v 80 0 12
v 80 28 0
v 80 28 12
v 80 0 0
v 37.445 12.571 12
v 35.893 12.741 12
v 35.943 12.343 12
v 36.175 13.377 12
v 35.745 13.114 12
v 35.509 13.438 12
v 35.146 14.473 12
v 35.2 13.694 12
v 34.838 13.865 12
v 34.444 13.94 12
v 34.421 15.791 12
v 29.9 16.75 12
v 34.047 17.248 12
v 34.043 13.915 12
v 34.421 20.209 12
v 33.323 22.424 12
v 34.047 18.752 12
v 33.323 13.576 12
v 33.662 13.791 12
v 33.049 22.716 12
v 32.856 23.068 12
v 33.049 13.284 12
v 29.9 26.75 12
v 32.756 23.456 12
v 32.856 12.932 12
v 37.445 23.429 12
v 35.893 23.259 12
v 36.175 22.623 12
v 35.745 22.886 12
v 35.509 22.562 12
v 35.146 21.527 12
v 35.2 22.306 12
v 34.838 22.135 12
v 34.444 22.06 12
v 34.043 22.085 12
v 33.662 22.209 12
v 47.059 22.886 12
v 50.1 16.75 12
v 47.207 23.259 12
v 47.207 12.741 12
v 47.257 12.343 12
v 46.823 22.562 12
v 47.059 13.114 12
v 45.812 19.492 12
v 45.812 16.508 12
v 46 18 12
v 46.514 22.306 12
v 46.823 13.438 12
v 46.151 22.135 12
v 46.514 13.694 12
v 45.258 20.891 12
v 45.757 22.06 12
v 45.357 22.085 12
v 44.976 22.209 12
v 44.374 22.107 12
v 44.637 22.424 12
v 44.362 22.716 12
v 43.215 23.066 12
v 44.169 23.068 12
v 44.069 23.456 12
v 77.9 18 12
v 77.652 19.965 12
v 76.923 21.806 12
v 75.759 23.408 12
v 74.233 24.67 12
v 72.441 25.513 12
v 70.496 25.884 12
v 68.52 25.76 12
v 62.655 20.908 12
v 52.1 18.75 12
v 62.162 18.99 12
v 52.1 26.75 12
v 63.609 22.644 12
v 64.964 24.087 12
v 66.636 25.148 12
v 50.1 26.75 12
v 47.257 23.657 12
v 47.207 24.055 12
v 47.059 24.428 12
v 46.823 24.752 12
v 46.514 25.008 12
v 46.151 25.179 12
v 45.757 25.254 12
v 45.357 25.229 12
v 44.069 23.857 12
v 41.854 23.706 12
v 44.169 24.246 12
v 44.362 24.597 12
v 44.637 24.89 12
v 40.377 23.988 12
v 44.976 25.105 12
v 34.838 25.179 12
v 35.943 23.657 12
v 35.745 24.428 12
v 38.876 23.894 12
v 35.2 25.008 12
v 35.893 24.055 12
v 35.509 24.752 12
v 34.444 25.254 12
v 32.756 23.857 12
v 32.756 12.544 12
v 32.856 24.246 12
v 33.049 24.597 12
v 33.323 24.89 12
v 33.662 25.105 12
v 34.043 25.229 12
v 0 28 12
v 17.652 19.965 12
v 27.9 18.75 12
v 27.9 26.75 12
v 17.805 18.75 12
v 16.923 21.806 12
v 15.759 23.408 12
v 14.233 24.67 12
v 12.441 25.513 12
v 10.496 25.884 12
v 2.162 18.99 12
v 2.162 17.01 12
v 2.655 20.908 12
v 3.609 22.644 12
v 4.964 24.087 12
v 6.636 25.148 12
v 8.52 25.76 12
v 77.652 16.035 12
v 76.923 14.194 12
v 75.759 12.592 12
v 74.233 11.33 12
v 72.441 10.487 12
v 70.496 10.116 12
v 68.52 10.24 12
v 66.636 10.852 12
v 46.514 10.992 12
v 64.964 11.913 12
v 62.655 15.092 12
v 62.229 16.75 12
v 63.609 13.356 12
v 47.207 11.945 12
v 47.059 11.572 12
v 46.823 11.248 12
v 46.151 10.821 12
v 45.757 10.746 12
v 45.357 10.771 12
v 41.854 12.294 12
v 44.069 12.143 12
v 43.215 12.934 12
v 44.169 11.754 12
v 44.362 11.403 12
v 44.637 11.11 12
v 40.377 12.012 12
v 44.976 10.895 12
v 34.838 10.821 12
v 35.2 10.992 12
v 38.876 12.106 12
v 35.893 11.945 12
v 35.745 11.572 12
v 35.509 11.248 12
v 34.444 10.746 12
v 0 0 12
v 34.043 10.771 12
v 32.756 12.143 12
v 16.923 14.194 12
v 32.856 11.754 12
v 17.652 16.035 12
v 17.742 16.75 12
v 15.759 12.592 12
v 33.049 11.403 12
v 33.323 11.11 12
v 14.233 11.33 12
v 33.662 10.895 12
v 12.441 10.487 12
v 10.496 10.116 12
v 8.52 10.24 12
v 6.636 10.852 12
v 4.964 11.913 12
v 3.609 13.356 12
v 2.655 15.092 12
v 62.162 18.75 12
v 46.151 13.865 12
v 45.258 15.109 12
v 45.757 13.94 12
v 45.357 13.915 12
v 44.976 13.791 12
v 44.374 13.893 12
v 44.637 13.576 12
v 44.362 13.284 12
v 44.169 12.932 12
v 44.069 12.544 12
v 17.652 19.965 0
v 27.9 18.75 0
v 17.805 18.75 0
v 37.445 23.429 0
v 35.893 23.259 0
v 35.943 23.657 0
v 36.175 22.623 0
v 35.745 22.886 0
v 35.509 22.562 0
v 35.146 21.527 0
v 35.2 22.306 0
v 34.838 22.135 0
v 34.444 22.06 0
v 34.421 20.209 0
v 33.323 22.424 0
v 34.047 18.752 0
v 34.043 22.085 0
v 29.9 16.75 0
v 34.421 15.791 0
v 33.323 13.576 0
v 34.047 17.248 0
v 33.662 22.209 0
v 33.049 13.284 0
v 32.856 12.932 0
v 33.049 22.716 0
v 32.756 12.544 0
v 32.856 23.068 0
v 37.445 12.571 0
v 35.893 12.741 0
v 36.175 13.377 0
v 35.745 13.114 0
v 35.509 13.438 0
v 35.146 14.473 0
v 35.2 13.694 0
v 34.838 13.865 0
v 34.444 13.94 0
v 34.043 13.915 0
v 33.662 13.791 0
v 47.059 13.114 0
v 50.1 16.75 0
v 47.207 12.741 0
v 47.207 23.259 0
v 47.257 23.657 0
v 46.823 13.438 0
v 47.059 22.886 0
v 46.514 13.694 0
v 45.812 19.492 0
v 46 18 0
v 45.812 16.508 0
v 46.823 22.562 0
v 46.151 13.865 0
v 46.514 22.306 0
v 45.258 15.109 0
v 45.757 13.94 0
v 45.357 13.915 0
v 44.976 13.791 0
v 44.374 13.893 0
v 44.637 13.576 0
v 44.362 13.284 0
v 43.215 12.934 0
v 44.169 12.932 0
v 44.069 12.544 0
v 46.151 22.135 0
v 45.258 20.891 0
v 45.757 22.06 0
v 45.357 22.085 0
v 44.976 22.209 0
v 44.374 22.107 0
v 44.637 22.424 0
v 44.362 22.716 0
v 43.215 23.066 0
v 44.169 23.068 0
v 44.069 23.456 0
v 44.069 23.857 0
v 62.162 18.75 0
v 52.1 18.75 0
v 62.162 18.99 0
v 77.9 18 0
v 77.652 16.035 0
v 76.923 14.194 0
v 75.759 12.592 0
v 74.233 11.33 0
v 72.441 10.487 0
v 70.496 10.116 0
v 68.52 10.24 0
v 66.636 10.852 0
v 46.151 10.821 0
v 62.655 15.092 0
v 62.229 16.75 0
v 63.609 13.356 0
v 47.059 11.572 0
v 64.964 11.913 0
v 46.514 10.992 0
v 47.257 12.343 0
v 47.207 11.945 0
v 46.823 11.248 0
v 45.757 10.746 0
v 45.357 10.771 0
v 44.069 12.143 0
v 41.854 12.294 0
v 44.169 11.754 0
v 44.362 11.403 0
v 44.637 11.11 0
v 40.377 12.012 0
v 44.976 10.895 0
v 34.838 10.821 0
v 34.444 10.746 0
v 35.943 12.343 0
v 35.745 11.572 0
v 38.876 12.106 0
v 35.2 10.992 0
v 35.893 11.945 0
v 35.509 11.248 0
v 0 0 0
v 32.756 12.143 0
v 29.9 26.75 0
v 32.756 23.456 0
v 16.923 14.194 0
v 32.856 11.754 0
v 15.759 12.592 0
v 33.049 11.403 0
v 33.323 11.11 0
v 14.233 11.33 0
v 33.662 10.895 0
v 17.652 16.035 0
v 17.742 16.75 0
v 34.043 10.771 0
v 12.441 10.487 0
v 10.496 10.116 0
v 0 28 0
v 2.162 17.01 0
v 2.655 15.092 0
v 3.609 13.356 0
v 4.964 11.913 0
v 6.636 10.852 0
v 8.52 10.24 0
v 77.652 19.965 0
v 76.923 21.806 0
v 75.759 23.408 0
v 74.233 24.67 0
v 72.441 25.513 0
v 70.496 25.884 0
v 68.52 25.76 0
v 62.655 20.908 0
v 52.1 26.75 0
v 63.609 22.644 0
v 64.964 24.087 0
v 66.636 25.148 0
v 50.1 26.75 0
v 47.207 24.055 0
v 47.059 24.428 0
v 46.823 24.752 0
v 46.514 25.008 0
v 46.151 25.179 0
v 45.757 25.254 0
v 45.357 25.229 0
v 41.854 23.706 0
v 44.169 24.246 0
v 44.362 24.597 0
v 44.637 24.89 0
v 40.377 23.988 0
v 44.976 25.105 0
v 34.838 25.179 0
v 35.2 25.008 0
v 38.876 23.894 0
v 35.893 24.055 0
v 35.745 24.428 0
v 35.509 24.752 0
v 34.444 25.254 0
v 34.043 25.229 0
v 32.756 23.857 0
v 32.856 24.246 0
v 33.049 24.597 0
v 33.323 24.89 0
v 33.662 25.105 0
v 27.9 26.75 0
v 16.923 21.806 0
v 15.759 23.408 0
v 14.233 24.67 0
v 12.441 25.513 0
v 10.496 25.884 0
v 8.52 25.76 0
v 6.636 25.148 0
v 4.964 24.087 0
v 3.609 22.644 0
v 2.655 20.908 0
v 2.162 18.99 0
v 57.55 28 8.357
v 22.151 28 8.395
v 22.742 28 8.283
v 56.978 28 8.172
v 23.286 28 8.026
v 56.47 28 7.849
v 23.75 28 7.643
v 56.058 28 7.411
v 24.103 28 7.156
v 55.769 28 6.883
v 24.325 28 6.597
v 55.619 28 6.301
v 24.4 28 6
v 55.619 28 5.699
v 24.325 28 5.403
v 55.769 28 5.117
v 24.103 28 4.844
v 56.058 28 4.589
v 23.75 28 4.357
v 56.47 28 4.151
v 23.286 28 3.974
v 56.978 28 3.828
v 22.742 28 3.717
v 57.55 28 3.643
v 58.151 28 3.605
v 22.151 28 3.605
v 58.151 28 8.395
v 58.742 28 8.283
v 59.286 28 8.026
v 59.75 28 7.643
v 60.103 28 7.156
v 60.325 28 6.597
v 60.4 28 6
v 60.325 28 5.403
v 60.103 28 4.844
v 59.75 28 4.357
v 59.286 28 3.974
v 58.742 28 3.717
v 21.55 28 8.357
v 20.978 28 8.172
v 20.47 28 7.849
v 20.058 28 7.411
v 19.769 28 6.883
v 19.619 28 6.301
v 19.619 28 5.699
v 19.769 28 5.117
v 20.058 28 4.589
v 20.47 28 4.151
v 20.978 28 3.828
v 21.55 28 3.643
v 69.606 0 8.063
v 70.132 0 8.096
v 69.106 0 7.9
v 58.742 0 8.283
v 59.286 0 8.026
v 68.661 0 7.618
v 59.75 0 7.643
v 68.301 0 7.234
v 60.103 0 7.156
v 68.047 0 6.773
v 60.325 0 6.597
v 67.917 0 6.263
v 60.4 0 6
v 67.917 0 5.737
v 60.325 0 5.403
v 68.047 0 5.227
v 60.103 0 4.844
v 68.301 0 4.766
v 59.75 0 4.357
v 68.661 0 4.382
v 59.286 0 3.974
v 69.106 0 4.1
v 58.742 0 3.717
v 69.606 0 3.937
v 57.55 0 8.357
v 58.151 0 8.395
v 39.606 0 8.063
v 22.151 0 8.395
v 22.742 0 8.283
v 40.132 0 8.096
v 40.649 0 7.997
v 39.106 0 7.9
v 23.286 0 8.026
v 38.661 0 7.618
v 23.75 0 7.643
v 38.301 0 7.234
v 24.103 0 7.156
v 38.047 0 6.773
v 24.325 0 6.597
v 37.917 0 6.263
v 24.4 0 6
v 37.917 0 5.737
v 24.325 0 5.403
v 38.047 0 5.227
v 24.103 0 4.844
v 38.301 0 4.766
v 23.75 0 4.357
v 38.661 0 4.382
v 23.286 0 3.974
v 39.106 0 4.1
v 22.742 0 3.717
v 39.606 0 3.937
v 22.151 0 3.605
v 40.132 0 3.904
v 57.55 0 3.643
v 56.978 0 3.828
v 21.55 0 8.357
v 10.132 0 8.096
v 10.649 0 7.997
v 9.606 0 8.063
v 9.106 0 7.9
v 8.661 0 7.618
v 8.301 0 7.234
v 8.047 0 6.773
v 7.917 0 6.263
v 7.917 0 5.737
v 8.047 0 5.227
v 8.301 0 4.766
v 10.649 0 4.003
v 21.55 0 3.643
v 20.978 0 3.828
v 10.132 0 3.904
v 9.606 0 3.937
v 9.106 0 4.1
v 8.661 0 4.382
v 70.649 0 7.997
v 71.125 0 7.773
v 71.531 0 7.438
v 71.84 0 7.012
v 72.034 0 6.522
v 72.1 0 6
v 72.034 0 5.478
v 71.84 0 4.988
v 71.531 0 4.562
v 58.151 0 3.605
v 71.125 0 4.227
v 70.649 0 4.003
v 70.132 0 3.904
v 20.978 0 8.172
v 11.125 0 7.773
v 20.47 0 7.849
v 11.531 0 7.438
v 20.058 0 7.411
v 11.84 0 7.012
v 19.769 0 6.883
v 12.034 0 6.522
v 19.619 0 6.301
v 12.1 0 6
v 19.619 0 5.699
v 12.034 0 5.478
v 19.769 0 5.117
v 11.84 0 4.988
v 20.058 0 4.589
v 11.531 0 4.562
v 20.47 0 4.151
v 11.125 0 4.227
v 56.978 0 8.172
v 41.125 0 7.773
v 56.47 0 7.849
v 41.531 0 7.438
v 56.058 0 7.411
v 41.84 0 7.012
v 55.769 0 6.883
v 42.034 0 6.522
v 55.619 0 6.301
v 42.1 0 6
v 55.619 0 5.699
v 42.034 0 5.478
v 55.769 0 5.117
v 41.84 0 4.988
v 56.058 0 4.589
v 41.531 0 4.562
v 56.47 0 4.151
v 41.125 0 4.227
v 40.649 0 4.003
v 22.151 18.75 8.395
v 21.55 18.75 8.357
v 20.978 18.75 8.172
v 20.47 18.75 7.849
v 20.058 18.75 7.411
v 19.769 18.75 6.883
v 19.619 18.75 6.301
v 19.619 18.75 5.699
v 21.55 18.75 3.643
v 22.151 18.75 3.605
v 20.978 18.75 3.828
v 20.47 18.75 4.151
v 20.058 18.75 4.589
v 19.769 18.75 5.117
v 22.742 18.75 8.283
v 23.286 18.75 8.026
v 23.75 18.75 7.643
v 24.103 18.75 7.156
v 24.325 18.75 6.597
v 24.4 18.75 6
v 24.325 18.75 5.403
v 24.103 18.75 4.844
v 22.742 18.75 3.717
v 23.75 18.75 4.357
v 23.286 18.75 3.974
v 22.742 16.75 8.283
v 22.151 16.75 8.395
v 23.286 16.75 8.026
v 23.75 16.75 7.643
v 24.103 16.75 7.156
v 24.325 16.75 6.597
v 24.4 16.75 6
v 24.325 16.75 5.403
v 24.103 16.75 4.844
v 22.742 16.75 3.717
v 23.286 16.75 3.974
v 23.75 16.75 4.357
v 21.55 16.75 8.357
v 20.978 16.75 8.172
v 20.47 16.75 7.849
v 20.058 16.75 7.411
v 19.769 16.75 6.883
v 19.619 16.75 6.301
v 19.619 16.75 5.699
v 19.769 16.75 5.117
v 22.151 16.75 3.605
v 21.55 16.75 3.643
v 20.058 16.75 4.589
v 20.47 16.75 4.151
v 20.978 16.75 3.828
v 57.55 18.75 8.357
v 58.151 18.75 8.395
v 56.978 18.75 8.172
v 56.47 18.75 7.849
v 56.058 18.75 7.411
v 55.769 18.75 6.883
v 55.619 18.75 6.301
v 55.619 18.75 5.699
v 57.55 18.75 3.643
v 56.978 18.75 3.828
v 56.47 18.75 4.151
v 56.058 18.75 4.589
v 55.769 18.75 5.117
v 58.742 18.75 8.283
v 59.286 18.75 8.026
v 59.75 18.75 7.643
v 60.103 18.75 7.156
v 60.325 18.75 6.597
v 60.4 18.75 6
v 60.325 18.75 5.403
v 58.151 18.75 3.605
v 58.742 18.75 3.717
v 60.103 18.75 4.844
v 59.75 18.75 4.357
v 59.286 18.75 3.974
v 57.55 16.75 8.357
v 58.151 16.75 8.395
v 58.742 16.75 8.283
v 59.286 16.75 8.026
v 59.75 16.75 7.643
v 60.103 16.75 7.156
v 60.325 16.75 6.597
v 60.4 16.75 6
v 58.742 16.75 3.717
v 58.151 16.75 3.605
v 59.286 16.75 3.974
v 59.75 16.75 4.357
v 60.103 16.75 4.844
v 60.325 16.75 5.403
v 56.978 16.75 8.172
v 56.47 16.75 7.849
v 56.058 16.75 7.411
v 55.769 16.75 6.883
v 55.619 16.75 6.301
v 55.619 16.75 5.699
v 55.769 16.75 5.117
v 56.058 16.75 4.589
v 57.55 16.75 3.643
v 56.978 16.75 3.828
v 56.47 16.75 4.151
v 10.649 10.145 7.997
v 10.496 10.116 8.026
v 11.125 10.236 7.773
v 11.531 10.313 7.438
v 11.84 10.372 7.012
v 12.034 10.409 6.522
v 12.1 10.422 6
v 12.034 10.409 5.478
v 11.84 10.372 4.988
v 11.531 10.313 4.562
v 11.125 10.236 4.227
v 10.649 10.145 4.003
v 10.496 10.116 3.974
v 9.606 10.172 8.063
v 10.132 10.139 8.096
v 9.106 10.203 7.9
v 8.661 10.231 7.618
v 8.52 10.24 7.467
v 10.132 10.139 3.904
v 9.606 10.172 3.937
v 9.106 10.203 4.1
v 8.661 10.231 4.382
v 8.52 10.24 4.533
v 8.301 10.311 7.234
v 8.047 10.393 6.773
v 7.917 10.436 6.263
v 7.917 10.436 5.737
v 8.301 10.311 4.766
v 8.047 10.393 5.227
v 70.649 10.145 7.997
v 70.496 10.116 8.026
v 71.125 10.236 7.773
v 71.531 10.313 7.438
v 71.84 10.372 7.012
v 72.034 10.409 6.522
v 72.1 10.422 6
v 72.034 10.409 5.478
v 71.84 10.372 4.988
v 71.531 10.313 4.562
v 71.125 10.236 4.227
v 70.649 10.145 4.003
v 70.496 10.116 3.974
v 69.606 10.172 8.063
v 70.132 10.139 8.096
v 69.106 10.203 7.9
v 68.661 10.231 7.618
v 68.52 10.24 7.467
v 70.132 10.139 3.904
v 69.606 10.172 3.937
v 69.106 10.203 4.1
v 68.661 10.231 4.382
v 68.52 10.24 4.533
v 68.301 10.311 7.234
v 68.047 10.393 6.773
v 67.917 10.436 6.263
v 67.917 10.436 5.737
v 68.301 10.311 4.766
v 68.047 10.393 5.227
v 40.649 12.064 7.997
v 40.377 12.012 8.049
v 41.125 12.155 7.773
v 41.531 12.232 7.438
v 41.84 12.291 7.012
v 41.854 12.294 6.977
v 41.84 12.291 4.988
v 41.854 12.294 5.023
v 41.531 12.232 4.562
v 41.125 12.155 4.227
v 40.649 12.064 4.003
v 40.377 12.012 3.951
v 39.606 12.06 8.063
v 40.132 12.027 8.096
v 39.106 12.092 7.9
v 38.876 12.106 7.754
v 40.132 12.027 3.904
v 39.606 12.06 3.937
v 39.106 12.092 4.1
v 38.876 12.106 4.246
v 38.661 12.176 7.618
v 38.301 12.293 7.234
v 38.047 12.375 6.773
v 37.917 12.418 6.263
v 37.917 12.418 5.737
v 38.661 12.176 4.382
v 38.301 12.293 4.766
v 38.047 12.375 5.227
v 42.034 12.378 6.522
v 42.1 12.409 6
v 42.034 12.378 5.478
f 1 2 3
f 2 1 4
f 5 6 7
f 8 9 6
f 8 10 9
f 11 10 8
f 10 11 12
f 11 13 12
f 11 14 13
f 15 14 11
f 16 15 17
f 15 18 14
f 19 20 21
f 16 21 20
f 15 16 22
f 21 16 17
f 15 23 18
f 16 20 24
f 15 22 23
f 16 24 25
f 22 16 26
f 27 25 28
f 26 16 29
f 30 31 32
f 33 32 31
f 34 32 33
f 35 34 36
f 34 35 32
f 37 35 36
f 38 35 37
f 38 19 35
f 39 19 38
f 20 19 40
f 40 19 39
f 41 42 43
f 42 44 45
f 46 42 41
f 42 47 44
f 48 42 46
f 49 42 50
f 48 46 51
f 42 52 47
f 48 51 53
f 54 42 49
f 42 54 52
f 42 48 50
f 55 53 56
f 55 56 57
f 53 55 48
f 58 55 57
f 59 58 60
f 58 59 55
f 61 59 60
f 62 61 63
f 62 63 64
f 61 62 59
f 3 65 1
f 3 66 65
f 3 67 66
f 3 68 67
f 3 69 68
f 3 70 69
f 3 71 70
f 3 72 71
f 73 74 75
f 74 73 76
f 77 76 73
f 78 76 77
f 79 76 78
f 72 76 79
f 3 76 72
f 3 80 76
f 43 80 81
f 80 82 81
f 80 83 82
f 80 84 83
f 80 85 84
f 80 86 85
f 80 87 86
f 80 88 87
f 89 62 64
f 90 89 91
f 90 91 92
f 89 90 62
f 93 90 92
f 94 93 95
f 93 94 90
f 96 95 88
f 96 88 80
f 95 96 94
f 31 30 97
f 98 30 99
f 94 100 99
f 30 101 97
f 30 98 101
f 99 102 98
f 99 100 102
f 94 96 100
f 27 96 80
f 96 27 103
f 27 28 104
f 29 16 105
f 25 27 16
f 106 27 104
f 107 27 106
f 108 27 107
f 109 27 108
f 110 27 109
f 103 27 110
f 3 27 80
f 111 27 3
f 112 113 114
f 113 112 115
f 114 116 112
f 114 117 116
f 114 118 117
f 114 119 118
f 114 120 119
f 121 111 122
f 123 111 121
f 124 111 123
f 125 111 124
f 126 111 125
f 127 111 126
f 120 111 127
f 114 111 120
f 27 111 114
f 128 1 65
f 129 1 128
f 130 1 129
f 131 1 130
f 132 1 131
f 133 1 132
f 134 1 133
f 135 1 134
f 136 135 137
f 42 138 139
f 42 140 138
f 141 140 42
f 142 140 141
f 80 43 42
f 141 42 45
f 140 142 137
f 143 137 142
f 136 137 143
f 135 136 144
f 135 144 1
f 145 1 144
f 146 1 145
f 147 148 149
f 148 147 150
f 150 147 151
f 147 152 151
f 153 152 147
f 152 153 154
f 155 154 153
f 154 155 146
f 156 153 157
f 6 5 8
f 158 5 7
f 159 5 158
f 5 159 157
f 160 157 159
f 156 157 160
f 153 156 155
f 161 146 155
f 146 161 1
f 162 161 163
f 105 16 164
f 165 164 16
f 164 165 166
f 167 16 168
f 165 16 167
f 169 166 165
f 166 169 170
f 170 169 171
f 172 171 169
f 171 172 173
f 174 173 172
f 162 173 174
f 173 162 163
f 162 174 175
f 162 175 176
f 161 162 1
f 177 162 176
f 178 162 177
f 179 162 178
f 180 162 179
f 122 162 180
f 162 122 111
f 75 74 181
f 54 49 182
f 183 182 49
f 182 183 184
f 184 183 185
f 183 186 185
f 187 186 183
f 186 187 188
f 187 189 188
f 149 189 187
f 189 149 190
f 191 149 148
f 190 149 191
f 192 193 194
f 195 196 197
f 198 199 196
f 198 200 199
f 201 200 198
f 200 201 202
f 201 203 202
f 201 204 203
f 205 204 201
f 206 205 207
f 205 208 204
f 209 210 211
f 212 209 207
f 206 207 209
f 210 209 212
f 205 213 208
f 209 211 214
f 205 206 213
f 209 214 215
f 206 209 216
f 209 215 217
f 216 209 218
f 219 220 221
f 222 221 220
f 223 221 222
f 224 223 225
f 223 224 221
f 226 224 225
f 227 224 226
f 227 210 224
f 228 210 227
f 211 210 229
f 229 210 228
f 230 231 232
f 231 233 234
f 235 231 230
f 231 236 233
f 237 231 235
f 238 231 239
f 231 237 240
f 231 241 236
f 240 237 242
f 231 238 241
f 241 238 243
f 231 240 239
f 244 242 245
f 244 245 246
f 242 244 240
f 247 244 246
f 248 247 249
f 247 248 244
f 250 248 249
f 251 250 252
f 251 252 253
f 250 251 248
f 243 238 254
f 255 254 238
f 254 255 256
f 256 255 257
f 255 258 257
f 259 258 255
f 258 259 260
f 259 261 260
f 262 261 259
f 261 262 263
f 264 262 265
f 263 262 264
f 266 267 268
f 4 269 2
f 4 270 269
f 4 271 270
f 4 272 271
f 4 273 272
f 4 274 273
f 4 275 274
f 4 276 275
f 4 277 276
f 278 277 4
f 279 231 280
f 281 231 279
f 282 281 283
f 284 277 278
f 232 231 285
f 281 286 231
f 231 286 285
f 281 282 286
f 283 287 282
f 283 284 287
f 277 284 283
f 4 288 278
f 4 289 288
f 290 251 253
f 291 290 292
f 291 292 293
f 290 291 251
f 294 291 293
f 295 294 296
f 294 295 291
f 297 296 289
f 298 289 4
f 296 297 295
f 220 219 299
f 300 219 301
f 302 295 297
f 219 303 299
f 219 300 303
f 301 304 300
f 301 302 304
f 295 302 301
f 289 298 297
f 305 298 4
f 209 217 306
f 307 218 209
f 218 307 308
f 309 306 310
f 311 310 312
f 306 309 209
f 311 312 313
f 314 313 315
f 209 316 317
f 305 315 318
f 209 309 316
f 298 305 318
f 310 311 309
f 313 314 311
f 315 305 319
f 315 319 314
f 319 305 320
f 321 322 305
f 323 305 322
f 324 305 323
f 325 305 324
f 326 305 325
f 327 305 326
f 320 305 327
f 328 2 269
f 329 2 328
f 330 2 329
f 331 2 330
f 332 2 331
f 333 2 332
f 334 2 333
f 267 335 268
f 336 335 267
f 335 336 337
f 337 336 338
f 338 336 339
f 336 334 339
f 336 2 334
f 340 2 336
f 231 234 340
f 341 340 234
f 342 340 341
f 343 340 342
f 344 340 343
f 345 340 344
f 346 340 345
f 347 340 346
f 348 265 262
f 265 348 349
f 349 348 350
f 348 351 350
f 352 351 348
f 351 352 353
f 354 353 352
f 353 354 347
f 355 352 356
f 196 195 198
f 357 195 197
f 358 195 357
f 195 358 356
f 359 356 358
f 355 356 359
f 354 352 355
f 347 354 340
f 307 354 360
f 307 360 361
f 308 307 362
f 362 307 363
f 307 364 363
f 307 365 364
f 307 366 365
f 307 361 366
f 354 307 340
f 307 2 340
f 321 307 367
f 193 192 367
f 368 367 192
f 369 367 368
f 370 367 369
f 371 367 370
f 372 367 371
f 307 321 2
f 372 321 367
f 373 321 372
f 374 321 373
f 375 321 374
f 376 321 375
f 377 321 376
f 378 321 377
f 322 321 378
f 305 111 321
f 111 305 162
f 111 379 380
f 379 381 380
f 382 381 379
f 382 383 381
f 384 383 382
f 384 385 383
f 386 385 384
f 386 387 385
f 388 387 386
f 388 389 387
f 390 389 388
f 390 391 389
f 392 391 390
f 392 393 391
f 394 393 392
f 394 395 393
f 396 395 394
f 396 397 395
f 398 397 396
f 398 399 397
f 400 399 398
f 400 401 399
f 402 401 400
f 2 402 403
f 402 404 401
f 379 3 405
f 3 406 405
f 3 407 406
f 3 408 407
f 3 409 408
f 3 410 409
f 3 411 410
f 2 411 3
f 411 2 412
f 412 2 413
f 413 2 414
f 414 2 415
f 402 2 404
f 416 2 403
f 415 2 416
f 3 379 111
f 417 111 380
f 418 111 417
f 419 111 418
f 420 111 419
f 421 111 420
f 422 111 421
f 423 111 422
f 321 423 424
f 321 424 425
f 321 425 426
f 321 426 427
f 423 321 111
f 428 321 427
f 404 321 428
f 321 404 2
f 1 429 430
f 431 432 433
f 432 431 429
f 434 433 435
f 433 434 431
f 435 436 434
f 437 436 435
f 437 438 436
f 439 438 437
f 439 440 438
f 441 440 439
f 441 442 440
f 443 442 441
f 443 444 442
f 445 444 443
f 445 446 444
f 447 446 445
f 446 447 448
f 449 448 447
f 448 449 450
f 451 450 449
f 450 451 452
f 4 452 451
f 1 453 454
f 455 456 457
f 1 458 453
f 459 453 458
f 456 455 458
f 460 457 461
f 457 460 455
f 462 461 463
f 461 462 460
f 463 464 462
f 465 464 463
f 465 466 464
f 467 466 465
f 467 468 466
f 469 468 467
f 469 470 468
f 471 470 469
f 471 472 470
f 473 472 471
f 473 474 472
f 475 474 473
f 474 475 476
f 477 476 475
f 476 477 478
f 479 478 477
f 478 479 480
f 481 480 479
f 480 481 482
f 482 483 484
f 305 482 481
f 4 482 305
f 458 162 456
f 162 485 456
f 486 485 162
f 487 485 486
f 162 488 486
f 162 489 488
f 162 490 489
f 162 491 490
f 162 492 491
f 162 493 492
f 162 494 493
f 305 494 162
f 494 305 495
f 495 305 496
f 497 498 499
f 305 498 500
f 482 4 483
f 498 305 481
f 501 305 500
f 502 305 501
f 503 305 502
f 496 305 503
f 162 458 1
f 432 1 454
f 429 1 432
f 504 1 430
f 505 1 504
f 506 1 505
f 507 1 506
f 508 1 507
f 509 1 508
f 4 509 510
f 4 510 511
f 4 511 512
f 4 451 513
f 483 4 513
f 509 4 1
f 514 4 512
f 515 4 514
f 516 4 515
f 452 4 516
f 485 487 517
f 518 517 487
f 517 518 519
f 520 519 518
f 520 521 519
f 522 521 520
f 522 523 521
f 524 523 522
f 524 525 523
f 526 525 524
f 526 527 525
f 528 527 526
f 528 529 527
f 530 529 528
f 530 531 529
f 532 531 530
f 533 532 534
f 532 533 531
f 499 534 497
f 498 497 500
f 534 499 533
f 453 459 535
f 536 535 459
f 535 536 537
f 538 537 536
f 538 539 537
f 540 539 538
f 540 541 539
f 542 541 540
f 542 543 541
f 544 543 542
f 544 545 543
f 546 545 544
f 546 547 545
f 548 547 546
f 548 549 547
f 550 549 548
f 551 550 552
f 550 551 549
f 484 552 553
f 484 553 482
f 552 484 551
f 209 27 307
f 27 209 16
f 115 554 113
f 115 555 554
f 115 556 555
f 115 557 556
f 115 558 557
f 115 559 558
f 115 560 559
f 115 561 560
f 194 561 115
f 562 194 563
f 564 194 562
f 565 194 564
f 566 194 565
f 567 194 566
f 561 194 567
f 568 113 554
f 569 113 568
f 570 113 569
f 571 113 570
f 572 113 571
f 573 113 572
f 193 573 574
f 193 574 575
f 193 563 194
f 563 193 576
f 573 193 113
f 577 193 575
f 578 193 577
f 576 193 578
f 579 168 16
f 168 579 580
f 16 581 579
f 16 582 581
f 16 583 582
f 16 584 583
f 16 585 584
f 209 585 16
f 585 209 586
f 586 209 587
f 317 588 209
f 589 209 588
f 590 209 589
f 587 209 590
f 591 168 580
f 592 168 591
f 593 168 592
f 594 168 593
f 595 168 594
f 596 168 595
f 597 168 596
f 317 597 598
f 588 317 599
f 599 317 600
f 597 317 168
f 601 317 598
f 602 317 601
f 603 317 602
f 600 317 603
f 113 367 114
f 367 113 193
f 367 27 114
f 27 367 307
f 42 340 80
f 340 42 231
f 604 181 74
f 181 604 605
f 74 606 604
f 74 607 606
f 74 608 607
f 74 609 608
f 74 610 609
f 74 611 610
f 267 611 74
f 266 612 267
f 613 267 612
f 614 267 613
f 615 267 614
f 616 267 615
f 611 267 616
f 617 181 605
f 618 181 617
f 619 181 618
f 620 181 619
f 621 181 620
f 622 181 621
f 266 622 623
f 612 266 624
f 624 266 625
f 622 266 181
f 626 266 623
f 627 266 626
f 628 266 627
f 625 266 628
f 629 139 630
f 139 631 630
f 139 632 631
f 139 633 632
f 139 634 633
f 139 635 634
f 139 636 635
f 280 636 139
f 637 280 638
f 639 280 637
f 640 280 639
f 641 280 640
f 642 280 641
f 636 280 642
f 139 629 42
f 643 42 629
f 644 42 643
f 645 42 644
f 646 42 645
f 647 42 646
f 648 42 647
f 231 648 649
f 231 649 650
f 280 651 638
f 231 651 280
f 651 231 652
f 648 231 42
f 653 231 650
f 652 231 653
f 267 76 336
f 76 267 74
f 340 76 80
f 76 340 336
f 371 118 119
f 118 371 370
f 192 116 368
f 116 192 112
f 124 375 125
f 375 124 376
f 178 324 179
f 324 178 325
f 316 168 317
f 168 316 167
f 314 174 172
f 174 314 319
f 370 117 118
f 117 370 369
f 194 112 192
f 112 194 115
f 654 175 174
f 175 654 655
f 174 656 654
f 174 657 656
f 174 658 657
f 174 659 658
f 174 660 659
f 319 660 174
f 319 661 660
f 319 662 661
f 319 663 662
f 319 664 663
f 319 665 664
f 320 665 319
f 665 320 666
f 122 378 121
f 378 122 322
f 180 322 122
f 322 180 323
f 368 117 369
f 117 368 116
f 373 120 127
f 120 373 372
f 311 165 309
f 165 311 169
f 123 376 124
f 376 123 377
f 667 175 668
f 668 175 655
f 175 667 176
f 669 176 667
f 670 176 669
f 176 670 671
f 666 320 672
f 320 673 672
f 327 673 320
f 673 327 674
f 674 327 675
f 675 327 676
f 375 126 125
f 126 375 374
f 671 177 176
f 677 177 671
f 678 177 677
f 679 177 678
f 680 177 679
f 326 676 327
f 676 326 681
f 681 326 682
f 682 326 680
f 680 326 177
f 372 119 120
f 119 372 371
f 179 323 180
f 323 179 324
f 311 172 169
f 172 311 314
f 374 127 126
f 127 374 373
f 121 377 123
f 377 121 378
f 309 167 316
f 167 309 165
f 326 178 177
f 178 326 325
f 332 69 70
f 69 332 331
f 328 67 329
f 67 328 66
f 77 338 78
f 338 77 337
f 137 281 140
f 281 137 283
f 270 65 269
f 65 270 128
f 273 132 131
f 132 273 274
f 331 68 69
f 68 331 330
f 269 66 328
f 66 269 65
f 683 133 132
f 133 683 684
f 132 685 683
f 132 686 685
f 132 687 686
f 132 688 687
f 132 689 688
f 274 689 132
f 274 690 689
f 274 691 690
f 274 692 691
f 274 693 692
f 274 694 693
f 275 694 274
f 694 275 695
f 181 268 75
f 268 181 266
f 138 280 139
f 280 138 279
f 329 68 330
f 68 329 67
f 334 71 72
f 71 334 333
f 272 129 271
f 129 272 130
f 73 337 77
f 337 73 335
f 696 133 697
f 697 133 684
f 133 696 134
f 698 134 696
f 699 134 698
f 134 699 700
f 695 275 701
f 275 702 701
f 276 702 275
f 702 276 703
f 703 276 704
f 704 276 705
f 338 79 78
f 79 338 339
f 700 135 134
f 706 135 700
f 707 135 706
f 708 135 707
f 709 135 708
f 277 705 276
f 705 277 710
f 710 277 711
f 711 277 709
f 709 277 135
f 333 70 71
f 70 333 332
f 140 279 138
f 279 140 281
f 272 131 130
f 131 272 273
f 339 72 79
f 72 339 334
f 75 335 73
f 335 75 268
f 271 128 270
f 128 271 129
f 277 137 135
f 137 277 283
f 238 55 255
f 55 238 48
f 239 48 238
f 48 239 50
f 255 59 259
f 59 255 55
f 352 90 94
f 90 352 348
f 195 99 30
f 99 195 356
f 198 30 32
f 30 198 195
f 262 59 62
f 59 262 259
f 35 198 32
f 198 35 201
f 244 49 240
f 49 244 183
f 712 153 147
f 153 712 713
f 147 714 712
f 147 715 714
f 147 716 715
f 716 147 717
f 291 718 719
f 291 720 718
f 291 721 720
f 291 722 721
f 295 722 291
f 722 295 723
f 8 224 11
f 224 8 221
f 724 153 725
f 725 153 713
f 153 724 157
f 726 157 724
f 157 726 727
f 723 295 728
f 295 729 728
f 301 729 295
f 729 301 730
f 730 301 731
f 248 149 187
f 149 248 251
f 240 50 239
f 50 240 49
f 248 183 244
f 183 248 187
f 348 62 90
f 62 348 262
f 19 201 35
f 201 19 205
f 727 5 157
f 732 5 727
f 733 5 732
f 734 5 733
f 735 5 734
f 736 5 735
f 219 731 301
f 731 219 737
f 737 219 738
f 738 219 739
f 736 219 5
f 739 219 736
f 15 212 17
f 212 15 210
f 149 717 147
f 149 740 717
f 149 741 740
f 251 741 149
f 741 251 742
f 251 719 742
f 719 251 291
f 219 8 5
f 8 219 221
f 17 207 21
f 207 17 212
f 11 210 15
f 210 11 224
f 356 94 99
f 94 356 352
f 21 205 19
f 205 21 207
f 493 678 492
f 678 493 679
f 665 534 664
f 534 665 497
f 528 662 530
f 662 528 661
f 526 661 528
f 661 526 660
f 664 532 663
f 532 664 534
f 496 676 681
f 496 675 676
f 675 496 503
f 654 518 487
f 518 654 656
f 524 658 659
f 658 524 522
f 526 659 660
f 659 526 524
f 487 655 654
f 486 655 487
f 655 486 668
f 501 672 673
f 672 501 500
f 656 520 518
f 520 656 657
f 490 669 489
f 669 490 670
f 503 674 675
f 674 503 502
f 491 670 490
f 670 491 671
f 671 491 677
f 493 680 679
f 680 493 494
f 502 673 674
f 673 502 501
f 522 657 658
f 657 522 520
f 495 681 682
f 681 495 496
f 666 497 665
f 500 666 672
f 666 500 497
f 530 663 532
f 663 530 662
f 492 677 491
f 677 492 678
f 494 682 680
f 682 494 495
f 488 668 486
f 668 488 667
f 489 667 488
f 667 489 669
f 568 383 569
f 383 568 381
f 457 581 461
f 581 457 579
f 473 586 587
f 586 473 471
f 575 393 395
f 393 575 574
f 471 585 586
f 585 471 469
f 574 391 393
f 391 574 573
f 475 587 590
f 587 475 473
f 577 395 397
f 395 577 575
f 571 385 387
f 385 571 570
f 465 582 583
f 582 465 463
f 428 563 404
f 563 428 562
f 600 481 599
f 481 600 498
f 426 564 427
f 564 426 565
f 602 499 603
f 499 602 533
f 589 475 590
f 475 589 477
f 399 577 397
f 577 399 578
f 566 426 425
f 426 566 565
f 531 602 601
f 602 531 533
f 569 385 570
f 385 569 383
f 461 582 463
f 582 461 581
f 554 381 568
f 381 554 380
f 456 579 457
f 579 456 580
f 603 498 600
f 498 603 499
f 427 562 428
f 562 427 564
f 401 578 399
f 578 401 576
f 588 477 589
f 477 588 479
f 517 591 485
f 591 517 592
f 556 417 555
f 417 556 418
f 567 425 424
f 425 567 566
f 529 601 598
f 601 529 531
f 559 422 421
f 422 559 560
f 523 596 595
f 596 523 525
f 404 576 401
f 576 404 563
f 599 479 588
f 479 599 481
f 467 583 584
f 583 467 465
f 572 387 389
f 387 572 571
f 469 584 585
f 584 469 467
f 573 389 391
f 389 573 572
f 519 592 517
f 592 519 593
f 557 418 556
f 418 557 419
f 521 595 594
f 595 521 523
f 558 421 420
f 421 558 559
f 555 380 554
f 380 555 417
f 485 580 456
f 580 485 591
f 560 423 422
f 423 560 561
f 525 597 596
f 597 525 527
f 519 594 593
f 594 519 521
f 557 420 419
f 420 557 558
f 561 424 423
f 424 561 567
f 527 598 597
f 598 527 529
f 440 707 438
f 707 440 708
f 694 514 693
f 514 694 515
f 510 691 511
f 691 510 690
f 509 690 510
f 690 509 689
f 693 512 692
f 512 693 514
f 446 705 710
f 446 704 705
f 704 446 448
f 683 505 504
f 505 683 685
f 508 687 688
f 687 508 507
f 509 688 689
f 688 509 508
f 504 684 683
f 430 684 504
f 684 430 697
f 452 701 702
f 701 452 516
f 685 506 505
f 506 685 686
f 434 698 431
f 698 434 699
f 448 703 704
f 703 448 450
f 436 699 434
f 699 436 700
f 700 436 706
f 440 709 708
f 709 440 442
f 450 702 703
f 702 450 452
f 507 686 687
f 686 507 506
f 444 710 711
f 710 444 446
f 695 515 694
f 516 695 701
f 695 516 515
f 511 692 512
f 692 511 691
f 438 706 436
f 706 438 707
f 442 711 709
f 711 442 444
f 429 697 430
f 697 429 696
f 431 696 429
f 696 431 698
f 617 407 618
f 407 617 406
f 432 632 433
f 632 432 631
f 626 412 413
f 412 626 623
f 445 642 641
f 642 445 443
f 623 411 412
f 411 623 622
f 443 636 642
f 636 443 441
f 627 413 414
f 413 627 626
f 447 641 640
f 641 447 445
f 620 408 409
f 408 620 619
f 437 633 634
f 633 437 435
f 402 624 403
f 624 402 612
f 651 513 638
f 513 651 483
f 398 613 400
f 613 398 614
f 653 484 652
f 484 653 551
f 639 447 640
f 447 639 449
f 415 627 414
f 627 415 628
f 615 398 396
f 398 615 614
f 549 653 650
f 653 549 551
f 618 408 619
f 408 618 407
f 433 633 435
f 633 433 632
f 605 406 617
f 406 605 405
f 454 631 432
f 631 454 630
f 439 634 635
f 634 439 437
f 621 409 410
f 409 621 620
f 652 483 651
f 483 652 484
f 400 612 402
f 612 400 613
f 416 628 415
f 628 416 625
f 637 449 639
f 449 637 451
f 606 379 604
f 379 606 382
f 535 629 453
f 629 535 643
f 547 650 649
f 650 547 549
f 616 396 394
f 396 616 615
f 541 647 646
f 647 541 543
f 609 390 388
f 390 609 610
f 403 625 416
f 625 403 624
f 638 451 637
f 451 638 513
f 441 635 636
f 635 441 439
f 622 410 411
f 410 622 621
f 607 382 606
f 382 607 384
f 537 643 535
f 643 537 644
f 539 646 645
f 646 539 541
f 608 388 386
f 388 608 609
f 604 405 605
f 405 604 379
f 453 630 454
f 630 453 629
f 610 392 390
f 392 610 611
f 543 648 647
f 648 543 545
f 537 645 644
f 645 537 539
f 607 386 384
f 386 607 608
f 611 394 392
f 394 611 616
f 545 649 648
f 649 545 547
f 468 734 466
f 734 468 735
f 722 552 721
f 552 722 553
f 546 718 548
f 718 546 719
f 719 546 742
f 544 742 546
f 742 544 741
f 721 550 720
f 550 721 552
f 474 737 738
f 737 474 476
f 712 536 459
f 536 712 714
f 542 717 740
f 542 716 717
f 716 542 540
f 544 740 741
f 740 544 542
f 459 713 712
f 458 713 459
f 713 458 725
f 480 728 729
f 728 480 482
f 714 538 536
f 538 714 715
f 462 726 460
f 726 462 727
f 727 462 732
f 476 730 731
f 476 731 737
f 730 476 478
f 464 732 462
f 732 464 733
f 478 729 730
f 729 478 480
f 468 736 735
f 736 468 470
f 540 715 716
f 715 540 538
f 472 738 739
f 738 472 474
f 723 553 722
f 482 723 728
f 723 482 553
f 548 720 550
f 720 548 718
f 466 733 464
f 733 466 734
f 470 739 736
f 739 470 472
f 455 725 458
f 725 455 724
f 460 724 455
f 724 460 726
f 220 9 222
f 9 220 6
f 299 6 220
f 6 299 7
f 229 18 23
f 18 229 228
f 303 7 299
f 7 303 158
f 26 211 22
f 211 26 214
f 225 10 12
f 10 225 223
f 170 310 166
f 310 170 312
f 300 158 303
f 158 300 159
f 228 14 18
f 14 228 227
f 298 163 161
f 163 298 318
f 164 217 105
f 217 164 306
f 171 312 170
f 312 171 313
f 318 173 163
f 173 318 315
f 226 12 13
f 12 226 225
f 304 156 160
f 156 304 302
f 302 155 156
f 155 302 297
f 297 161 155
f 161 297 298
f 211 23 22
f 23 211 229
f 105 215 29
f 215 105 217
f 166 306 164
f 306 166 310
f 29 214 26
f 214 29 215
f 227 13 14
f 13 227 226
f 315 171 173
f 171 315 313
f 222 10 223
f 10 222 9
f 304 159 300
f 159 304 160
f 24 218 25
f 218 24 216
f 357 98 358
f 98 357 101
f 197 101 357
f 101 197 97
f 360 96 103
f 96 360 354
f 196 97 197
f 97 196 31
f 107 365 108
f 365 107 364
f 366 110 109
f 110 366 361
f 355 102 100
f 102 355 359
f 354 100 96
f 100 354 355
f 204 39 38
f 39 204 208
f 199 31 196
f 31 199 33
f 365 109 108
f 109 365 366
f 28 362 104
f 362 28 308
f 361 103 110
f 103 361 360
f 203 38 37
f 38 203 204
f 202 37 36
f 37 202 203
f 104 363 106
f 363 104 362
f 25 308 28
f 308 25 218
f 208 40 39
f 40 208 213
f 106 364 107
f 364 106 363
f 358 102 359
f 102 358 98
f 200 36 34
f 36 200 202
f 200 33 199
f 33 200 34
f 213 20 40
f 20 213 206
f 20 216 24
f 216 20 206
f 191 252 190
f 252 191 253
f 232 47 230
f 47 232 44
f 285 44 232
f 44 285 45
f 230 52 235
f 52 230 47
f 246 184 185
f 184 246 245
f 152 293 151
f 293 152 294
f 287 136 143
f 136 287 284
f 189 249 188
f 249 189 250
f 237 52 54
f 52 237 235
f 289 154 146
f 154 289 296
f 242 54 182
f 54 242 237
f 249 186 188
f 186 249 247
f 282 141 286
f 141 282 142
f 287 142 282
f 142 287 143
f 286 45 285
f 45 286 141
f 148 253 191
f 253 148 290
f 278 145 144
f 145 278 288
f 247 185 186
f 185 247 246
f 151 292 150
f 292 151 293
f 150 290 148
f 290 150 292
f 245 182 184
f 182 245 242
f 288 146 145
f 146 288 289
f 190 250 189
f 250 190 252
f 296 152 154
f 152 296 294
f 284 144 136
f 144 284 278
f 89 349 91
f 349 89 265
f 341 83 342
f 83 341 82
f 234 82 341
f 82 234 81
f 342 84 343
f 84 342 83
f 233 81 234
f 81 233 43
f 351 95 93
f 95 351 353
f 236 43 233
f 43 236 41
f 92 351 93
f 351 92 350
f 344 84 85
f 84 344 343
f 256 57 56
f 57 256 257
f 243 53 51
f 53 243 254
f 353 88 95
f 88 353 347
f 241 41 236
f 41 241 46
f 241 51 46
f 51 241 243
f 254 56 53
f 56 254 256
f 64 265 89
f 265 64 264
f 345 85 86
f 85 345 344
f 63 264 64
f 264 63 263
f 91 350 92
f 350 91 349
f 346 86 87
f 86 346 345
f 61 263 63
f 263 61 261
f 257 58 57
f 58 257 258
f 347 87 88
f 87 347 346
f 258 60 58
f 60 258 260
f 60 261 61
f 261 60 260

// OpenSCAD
// dual holder for linear bearing D_in=8mm, D_out=15mm, L=25mm.
d_in   =  8.0;   // inner diameter (unused )
d_out  = 15.0;   // outer diameter
L_bear = 25.0;  // bearing length (unused)(Z)

r_out  = d_out / 2 + 0.4;
r_h    = 4.0   / 2 + 0.4;   // main mounting hole
r_hv   = 3.0   / 2 + 0.1;   // vert mounting hole

x_a =  80;
y_a =  28;
z_a =  12;

x_1 =  10.0;
x_2 = x_a - x_1;

y_w    = 2.5;   //
z_w    = 2.0;   //

x_c = x_a / 2;
y_c = 18.0; // y_a / 2;
z_c = z_a / 2;

dx = x_2 - x_1;
d_m = 8 / sqrt(2.0);

$fn=25;

module lbe_ho_2x_8x25_1side_10mm()
{
  difference() {
    union() {
      cube( [x_a,y_a,z_a] );
    }
    // place for bearing
    translate([ x_1+r_out- 1,y_c-y_w/2,0]) cube( [13,2.0,z_a] );
    translate([ x_1+r_out+10,y_c-y_w/2,0]) cube( [2.0,10.0,z_a] );
    translate([ x_2-r_out-12,y_c-y_w/2,0]) cube( [13,2.0,z_a] );
    translate([ x_2-r_out-12,y_c-y_w/2,0]) cube( [2.0,10.0,z_a] );
    translate([ x_1,y_c,0]) cylinder( r=r_out, h=z_a );
    translate([ x_2,y_c,0]) cylinder( r=r_out, h=z_a );
    translate([ x_c,y_c,0]) cylinder( r=6.0,  h=z_a );
    // mounting holes
    translate([ x_1   ,0,z_c]) rotate([-90,0,0])  cylinder( r=r_h-0.3, h=y_c );
    translate([ x_1+12,0,z_c]) rotate([-90,0,0])  cylinder( r=r_h    , h=y_a );
    translate([ x_2   ,0,z_c]) rotate([-90,0,0])  cylinder( r=r_h-0.3, h=y_c );
    translate([ x_2-12,0,z_c]) rotate([-90,0,0])  cylinder( r=r_h    , h=y_a );
    translate([ x_c   ,0,z_c]) rotate([-90,0,0])  cylinder( r=r_h-0.3, h=y_c );
    translate([ x_c-d_m,y_c-d_m,0]) cylinder( r=r_hv, h=y_a );
    translate([ x_c-d_m,y_c+d_m,0]) cylinder( r=r_hv, h=y_a );
    translate([ x_c+d_m,y_c-d_m,0]) cylinder( r=r_hv, h=y_a );
    translate([ x_c+d_m,y_c+d_m,0]) cylinder( r=r_hv, h=y_a );
  }
}

//translate([ 0,-4,0]) cube( [x_1,1,1] );
//projection(cut = true)
lbe_ho_2x_8x25_1side_10mm();
echo( "x_a= ", x_a, "y_a= ", y_a, "z_a= ", z_a );
echo( "x1= ", x_1, "x_2=", x_2, " dx= ", dx );
